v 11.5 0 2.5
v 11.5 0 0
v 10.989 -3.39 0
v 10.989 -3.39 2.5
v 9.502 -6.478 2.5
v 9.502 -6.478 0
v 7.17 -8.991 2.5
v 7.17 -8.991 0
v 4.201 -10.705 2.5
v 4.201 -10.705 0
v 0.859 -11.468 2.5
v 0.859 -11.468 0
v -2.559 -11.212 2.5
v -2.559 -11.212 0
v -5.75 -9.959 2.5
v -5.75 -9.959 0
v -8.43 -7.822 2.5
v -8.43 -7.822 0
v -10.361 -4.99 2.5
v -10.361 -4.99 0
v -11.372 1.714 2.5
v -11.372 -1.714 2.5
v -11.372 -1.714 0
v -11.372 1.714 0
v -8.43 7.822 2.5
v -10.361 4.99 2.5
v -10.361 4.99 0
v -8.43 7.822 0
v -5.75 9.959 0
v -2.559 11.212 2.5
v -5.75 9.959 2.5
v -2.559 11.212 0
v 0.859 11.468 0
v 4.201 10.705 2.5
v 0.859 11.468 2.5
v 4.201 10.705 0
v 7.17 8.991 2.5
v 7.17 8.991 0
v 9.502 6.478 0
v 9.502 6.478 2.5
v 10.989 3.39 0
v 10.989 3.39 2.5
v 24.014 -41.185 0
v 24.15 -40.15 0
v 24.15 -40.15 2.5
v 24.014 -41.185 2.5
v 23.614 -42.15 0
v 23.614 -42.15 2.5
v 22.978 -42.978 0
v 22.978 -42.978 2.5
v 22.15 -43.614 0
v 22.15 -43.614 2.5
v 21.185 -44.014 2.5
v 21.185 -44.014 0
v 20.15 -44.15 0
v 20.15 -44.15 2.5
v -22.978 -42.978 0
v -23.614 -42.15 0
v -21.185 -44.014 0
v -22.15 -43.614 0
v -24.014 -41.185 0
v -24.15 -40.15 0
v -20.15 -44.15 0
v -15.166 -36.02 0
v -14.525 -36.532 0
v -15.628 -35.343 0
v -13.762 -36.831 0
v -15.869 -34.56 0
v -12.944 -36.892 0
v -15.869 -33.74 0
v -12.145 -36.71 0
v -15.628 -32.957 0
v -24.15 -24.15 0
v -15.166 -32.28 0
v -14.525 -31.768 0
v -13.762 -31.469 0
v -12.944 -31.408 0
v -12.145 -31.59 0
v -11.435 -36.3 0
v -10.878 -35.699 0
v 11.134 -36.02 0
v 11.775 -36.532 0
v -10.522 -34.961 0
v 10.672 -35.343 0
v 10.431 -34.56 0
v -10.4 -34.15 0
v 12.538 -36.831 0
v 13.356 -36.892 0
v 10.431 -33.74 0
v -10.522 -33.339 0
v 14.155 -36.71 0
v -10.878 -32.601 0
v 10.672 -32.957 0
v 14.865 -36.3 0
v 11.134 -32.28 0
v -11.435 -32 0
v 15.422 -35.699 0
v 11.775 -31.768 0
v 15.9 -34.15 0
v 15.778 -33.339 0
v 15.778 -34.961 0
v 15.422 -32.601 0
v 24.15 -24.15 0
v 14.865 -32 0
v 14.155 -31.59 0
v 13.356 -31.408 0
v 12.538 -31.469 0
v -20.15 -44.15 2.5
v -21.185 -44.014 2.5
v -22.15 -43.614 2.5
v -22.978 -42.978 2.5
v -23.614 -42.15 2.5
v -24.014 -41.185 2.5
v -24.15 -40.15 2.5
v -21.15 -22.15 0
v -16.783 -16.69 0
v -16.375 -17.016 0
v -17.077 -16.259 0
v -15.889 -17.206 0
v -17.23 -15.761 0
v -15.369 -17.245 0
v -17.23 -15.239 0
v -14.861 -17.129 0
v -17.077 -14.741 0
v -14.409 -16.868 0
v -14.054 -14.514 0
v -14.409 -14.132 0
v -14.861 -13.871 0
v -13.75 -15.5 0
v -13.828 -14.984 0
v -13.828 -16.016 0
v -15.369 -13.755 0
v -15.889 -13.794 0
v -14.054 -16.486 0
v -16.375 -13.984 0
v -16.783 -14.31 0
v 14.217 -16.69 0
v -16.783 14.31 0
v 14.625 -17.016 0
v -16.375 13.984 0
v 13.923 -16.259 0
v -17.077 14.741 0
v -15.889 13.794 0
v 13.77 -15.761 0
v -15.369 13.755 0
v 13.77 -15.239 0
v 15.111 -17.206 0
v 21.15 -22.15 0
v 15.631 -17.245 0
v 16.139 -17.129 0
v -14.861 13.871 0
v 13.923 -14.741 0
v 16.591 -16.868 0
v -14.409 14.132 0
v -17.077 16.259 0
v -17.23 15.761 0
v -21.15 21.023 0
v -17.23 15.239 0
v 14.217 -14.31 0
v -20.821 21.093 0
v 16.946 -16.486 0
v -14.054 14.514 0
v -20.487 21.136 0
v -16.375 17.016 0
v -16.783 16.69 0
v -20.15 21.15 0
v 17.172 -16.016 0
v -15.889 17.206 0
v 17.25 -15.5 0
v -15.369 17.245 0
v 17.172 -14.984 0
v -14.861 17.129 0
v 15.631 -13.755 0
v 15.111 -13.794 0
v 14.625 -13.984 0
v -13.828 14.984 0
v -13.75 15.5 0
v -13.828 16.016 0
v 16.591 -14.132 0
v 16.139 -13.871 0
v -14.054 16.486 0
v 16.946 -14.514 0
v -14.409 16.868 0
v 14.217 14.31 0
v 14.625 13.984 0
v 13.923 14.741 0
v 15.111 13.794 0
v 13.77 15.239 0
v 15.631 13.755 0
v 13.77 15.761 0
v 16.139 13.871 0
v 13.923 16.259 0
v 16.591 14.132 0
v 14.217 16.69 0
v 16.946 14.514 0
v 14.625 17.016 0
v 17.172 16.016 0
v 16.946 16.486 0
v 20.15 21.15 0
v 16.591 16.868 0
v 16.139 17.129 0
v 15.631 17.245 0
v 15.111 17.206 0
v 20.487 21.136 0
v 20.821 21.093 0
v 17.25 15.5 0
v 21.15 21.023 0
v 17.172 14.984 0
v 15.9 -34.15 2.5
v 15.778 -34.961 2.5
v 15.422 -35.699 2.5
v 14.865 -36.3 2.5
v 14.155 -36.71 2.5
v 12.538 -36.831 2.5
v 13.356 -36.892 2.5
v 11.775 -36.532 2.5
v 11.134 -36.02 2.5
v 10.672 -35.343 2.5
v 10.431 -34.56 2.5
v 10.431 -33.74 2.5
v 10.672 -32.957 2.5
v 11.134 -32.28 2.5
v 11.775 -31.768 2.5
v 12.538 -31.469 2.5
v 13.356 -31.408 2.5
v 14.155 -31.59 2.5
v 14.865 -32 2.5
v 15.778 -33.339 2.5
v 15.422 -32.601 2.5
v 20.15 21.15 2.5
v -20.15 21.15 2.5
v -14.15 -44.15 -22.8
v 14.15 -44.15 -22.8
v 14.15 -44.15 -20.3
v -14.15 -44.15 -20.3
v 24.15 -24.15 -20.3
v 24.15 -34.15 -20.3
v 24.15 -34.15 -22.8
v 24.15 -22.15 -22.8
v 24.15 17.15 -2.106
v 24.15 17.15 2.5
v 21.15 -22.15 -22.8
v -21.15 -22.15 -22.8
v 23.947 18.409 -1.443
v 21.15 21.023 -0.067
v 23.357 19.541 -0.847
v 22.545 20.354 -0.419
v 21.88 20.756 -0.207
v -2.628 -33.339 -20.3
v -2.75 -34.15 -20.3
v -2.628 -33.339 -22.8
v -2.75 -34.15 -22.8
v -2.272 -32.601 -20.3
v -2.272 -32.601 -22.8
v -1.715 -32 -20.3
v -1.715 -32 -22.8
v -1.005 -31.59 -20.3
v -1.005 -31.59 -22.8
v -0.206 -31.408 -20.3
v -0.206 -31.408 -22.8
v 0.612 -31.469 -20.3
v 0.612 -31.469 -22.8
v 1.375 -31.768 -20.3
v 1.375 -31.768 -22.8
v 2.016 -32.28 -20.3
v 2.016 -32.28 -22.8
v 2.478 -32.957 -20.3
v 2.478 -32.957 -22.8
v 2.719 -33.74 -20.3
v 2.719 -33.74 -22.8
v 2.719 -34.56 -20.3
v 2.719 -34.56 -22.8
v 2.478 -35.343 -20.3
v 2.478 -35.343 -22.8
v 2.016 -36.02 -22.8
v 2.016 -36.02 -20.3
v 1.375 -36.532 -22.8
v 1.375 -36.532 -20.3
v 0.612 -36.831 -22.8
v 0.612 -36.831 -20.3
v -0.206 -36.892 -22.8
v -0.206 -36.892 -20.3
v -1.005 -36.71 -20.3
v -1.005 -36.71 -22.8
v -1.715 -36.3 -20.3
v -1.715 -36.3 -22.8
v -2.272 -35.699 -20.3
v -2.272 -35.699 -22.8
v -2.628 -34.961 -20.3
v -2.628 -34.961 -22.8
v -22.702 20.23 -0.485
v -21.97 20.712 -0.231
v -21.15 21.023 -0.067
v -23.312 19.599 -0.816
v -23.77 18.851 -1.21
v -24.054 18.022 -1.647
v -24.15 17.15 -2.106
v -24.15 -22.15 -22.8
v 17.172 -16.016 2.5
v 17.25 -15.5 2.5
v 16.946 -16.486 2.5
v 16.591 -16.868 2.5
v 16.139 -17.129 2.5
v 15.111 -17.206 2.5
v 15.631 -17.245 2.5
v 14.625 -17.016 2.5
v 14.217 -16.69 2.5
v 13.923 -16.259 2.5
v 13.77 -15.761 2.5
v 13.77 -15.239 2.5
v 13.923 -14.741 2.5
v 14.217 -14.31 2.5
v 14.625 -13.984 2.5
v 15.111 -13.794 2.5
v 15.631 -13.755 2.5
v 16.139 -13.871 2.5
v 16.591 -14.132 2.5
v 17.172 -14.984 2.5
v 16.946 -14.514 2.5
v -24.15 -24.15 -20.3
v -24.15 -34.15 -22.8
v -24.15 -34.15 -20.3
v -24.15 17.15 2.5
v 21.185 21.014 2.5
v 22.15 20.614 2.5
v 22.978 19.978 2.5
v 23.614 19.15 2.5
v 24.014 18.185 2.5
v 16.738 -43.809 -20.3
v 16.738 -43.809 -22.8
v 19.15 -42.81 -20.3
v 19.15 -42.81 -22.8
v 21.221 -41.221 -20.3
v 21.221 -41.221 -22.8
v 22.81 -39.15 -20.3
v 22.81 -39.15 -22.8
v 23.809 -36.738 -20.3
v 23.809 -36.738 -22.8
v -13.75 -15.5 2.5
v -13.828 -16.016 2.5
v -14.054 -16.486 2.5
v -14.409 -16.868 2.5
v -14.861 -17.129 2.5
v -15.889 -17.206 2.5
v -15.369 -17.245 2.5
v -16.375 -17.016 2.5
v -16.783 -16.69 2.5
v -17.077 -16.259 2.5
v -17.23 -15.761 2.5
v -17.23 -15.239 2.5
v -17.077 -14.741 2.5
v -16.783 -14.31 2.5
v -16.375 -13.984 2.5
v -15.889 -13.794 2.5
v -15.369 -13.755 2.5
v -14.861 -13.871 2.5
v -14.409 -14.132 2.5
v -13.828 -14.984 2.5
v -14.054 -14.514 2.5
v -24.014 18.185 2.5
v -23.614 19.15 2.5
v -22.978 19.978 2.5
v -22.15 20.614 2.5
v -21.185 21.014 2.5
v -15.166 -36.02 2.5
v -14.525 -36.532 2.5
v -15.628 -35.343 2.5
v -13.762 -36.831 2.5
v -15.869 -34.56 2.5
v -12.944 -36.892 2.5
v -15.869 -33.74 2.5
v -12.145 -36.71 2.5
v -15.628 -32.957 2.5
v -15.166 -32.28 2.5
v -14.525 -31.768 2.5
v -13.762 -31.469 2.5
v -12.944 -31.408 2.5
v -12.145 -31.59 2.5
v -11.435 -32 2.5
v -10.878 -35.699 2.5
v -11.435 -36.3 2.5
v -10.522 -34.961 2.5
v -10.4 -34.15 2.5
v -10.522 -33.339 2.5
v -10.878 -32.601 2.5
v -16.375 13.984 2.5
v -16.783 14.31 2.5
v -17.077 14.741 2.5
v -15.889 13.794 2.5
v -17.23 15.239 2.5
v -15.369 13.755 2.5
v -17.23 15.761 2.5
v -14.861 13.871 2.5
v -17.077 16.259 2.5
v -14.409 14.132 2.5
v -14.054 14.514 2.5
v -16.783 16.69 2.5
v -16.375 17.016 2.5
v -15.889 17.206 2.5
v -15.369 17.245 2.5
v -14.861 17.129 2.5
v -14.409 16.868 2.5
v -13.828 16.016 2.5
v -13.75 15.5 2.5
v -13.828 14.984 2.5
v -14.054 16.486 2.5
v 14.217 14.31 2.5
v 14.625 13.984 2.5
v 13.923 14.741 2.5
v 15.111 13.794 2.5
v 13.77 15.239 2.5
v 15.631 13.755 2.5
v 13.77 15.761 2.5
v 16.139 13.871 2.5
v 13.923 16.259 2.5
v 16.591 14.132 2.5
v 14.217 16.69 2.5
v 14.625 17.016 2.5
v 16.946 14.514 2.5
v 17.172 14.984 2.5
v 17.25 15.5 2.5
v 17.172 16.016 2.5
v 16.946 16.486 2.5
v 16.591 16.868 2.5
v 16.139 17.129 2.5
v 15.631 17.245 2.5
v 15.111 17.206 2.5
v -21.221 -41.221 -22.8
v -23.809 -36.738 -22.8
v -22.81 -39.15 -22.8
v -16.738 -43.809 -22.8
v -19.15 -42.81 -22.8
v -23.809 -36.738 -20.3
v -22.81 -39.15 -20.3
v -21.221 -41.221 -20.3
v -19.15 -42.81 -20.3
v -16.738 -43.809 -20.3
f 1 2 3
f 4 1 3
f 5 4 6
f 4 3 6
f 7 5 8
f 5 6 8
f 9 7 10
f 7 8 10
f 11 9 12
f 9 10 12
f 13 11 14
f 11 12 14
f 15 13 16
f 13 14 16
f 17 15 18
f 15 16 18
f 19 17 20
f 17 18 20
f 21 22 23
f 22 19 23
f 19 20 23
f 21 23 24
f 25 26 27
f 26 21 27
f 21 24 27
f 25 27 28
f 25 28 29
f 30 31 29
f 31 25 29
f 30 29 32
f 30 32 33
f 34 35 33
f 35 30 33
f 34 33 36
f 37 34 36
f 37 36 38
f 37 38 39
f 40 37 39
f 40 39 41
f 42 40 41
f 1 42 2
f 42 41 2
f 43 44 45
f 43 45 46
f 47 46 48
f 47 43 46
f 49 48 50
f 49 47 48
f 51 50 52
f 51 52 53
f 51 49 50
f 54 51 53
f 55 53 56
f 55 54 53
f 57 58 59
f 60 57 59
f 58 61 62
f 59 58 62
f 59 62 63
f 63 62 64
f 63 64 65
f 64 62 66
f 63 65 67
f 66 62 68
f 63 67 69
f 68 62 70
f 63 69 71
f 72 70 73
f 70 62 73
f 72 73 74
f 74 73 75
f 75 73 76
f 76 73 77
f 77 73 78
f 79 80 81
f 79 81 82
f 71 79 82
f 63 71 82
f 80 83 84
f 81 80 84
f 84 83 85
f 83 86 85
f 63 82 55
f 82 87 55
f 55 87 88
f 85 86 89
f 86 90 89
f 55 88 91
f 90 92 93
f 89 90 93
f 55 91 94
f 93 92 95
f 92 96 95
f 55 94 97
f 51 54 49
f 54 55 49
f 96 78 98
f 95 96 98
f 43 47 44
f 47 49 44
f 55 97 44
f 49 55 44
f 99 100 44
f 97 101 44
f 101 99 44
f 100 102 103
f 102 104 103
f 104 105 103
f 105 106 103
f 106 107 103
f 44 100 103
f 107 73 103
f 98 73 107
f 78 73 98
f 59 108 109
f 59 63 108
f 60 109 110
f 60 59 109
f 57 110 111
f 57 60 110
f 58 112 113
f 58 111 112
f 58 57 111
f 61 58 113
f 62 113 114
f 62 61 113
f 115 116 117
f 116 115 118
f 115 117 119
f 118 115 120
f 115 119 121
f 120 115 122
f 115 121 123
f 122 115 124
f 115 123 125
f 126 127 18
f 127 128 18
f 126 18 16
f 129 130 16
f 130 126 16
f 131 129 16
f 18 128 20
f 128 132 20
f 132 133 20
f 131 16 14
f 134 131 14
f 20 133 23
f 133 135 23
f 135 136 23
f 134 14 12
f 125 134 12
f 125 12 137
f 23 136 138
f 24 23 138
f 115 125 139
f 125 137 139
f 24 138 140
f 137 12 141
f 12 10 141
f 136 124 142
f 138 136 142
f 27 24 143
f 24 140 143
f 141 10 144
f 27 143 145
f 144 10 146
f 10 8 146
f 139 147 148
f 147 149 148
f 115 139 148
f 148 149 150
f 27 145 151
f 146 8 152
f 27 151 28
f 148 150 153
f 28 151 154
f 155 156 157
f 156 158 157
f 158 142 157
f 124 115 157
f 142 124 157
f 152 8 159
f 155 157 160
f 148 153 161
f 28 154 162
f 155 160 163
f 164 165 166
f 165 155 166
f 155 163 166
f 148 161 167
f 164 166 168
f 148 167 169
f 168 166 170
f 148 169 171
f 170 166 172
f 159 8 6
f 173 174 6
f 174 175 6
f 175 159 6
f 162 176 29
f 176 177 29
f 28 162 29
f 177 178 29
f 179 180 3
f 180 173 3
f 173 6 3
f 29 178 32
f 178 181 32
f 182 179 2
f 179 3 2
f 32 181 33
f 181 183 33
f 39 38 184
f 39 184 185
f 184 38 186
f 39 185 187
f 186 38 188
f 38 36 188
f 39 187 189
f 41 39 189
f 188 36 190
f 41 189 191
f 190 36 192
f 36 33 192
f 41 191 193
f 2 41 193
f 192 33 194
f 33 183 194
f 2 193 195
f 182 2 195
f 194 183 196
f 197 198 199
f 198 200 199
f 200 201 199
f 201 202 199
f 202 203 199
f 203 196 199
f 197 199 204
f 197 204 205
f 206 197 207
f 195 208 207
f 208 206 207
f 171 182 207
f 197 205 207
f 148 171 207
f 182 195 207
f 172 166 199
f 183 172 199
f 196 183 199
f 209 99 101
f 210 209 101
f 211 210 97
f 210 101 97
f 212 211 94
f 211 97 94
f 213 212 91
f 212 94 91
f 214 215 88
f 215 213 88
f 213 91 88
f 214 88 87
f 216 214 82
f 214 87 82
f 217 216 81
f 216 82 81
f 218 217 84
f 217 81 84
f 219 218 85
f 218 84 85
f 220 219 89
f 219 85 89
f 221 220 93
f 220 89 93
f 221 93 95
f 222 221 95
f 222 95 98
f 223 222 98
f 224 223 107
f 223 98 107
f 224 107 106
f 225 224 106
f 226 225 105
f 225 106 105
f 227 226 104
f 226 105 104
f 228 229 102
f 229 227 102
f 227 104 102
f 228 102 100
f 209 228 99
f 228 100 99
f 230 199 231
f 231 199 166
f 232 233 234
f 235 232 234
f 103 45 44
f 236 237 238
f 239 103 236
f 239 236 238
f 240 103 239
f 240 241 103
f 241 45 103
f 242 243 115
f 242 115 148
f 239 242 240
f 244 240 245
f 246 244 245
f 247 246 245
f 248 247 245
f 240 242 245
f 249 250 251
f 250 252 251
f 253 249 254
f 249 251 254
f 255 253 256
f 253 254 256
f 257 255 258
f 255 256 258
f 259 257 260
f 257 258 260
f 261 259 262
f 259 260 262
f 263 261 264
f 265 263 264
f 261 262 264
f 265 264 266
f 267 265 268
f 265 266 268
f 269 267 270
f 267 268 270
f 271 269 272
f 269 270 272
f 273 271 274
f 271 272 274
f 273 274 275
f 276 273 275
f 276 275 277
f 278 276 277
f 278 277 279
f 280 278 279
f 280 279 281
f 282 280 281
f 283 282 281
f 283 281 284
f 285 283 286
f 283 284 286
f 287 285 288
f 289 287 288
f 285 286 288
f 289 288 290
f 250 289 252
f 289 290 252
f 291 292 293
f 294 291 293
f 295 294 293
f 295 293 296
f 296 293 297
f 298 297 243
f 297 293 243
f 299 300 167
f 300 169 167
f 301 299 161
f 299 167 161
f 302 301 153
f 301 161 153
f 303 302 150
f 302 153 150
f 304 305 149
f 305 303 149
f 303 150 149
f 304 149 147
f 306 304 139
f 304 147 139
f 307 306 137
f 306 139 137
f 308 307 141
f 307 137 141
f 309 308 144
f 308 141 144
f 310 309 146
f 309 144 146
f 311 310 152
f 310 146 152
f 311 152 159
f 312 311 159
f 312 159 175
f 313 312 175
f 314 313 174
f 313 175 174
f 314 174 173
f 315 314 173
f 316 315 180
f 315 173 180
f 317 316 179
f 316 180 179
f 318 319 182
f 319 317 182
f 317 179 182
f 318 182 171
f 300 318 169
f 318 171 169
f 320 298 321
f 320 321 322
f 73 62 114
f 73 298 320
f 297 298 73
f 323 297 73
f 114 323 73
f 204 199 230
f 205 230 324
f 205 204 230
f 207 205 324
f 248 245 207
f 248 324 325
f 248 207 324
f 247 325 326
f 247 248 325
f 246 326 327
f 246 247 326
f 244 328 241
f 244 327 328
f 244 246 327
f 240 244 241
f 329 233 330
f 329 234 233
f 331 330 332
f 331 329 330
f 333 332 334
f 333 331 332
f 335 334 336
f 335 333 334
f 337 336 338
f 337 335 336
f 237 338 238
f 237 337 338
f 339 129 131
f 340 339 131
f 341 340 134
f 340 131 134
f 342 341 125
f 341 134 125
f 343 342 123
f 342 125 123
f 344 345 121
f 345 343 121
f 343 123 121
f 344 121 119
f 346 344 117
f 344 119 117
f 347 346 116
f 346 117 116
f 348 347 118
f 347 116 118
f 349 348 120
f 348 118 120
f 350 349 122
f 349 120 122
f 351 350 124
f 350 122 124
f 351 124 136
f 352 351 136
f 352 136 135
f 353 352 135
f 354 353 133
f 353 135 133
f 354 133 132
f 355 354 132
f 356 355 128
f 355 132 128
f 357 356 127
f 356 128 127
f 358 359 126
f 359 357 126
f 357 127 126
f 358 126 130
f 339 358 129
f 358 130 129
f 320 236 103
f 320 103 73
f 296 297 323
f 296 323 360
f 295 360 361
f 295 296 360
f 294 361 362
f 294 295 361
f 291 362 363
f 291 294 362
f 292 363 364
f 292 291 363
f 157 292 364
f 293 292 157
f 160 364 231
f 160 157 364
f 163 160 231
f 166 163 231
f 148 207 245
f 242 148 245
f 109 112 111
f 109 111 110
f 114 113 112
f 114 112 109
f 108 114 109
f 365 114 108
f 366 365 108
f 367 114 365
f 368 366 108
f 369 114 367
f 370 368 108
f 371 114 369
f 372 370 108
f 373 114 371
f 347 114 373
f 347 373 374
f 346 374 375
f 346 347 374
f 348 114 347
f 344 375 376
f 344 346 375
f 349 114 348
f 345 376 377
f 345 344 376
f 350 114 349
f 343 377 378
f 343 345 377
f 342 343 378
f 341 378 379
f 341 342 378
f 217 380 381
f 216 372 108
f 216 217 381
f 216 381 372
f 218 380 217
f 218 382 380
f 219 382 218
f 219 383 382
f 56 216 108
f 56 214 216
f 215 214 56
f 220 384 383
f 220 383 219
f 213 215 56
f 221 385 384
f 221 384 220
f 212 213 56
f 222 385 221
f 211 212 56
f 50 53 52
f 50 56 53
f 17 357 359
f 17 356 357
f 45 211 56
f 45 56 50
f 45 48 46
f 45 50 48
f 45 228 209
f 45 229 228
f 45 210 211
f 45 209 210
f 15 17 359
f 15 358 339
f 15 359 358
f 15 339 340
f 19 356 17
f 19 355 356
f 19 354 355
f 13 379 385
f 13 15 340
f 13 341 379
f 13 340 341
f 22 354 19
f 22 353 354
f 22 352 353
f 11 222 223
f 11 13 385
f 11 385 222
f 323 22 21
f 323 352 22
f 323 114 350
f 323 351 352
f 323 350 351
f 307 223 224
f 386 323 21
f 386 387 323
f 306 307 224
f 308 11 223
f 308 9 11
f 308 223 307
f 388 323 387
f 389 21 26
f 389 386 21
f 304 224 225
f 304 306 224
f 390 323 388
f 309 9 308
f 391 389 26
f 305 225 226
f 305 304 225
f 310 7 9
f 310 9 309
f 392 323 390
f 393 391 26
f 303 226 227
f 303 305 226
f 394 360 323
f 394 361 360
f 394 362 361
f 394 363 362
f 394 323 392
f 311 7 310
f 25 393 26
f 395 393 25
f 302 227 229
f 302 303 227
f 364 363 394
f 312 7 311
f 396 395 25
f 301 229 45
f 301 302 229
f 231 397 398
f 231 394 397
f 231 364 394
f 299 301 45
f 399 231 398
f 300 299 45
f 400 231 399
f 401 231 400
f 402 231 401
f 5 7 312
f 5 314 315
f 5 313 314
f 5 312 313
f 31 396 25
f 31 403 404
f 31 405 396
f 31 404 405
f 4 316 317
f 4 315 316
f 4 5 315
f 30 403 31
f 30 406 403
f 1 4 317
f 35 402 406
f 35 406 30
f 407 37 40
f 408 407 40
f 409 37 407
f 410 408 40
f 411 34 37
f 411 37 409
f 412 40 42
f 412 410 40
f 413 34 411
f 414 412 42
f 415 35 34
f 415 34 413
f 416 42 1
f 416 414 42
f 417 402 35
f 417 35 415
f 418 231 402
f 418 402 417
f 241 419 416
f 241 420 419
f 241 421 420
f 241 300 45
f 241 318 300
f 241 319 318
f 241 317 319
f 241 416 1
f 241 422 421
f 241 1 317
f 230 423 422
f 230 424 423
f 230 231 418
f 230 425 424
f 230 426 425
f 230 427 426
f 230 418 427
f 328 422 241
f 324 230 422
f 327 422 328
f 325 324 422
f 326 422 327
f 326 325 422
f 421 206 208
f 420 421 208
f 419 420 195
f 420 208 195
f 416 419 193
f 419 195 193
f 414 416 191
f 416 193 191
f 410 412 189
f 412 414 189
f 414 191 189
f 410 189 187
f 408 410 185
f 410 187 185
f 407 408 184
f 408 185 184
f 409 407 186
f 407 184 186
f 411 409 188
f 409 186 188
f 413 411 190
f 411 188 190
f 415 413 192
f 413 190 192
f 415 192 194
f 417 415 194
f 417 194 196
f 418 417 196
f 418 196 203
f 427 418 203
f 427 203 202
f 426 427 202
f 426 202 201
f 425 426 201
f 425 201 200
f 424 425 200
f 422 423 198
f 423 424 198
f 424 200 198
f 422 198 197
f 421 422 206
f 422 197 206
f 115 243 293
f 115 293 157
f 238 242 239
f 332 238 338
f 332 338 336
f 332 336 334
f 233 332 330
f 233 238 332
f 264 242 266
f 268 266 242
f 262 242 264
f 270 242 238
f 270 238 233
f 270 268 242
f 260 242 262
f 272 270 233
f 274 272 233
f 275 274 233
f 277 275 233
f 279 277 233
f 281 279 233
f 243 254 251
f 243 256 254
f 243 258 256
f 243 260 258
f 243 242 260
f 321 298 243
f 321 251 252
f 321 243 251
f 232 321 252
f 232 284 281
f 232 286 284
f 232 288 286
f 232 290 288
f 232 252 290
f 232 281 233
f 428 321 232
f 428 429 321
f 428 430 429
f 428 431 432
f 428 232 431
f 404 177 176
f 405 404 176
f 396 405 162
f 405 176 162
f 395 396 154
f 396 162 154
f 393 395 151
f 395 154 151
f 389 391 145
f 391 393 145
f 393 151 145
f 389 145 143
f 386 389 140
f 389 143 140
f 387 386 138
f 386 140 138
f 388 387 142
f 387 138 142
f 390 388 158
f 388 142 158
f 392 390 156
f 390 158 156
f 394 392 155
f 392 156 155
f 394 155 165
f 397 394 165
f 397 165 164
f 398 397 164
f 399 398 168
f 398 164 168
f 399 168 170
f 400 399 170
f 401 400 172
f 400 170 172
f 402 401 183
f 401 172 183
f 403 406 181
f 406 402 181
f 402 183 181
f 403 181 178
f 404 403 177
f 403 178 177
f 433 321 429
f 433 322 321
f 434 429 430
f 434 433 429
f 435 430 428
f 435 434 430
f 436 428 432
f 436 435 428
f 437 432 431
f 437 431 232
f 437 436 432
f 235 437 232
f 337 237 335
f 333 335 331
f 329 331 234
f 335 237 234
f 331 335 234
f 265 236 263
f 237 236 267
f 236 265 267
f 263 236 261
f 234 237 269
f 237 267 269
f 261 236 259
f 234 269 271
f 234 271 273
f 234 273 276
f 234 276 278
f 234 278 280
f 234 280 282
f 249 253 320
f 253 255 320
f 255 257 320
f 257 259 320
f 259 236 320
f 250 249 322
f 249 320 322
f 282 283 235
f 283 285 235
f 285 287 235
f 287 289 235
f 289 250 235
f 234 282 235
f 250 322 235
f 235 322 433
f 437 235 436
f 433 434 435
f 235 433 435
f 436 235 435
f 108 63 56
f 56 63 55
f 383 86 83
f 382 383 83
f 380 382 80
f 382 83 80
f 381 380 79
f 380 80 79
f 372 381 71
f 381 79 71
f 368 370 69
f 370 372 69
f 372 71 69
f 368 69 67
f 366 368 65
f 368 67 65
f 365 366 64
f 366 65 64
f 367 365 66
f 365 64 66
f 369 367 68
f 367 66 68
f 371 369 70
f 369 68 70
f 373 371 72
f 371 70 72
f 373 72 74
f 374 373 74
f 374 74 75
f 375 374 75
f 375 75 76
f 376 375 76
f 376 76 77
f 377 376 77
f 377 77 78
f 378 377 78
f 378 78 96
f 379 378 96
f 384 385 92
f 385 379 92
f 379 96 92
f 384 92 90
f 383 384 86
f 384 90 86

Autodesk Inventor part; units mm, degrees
ref_plane "YZ Plane" through (0, 0, 0) normal (1, 0, 0) x (0, 1, 0)
ref_plane "XZ Plane" through (0, 0, 0) normal (0, 1, 0) x (-1, 0, 0)
ref_plane "XY Plane" through (0, 0, 0) normal (0, 0, 1) x (1, 0, 0)
sketch "Sketch1" plane through (0, 0, 0) normal (0, 0, 1) x (1, 0, 0)
  line L0 (-21.15, -21.15) -> (21.15, -21.15) construction
  line L1 (21.15, -21.15) -> (21.15, 21.15)
  line L2 (21.15, 21.15) -> (-21.15, 21.15)
  line L3 (-21.15, 21.15) -> (-21.15, -21.15)
  line L4 (-21.15, -21.15) -> (21.15, 21.15) construction
  line L5 (21.15, -21.15) -> (-21.15, 21.15) construction
  line L6 (15.5, 15.5) -> (-15.5, 15.5) construction
  line L7 (-15.5, 15.5) -> (-15.5, -15.5) construction
  line L8 (-15.5, -15.5) -> (15.5, -15.5) construction
  line L9 (15.5, -15.5) -> (15.5, 15.5) construction
  line L10 (15.5, 15.5) -> (-15.5, -15.5) construction
  line L11 (-15.5, 15.5) -> (15.5, -15.5) construction
  line L12 (-21.15, -21.15) -> (-21.15, -44.15)
  line L13 (-21.15, -44.15) -> (21.15, -44.15)
  line L14 (21.15, -44.15) -> (21.15, -21.15)
  line L15 (21.15, -34.15) -> (-21.15, -34.15) construction
  circle A0 centre (-13.15, -34.15) radius 2.75
  circle A1 centre (13.15, -34.15) radius 2.75
  circle A2 centre (0, 0) radius 11.5
  circle A3 centre (-15.5, -15.5) radius 1.75
  circle A4 centre (15.5, -15.5) radius 1.75
  circle A5 centre (-15.5, 15.5) radius 1.75
  circle A6 centre (15.5, 15.5) radius 1.75
  dimension "d0" = 42.3
  dimension "d1" = 42.3
  dimension "d2" = 10
  dimension "d3" = 23
  dimension "d4" = 8
  dimension "d5" = 8
  dimension "d6" = 5.5
  dimension "d7" = 31
  dimension "d8" = 3.5
  dimension "d9" = 23
extrude "Extrusion1" add sketch "Sketch1" along normal blind 2.5
sketch "Sketch2" plane through (21.15, -44.15, 0) normal (1, 0, 0) x (0, 0, -1)
  line L0 (0, 0) -> (-2.5, 0) construction
  line L1 (0, 65.3) -> (-2.5, 65.3) construction
  line L2 (-2.5, 0) -> (-2.5, 65.3) construction
  line L3 (-2.5, 65.3) -> (0, 65.3) construction
  line L4 (0, 65.3) -> (20.3, 22) construction
  line L5 (20.3, 22) -> (20.3, 0)
  line L6 (20.3, 0) -> (-2.5, 0) construction
  line L7 (20.3, 22) -> (0, 22)
  line L8 (0, 22) -> (0, 65.3)
  line L9 (20.3, 0) -> (22.8, 0)
  line L10 (22.8, 0) -> (22.8, 22)
  line L11 (0, 0) -> (0, 65.3) projected
  line L12 (22.8, 22) -> (0, 65.3)
  line L13 (20.3, 22) -> (22.8, 22) construction
  line L14 (0, 0) -> (0, 65.3) projected
  line L15 (0, 65.3) -> (-2.5, 65.3) projected
  line L16 (-2.5, 0) -> (-2.5, 65.3) projected
  line L17 (0, 0) -> (-2.5, 0) projected
  point P0 (0, 44.15)
  point P1 (0, 65.3)
  dimension "d12" = 22
  dimension "d14" = 2.5
  dimension "d28" = 20.3
extrude "Extrusion2" add sketch "Sketch2" along normal blind 3
mirror "Mirror1" about plane through (0, 0, 0) normal (1, 0, 0) of "Extrusion2"
sketch "Sketch3" plane through (-21.15, -44.15, -20.3) normal (1, 0, 0) x (0, 0, -1)
  line L0 (0, 22) -> (0, 0) projected
  line L1 (0, 22) -> (2.5, 22)
  line L2 (2.5, 22) -> (2.5, 0)
  line L3 (2.5, 0) -> (0, 0)
  line L4 (0, 0) -> (0, 22)
  point P0 (-20.3, 44.15)
extrude "Extrusion3" add sketch "Sketch3" along normal up to surface (42.3 mm away)
sketch "Sketch4" plane through (24.15, -44.15, -20.3) normal (0, 0, 1) x (1, 0, 0)
  line L0 (-45.3, 22) -> (-48.3, 22) projected
  line L1 (0, 22) -> (0, 0) projected
  line L2 (-48.3, 22) -> (0, 22)
  line L3 (0, 22) -> (0, 20)
  line L4 (0, 20) -> (-48.3, 20)
  line L5 (-48.3, 20) -> (-48.3, 22)
  point P0 (-24.15, 44.15)
  point P1 (0, 22)
  dimension "d19" = 2
extrude "Extrusion4" add sketch "Sketch4" along normal up to surface (20.3 mm away)
sketch "Sketch5" plane through (24.15, -44.15, -22.8) normal (0, 0, -1) x (-1, 0, 0)
  line L0 (48.3, 0) -> (0, 0) projected
  line L1 (24.15, 0) -> (24.15, 10) construction
  circle A0 centre (24.15, 10) radius 2.75
  point P0 (24.15, 44.15)
  dimension "d22" = 5.5
  dimension "d23" = 10
extrude "Extrusion5" cut sketch "Sketch5" against normal up to surface (2.5 mm away)
fillet "Fillet1" radius 10 2 edges at (24.15, -44.15, -21.55) (-24.15, -44.15, -21.55)
fillet "Fillet1" radius 4 4 edges at (-24.15, -44.15, 1.25) (24.15, -44.15, 1.25) (24.15, 21.15, 1.25) (-24.15, 21.15, 1.25)
properties part number "MotorBracket1"
